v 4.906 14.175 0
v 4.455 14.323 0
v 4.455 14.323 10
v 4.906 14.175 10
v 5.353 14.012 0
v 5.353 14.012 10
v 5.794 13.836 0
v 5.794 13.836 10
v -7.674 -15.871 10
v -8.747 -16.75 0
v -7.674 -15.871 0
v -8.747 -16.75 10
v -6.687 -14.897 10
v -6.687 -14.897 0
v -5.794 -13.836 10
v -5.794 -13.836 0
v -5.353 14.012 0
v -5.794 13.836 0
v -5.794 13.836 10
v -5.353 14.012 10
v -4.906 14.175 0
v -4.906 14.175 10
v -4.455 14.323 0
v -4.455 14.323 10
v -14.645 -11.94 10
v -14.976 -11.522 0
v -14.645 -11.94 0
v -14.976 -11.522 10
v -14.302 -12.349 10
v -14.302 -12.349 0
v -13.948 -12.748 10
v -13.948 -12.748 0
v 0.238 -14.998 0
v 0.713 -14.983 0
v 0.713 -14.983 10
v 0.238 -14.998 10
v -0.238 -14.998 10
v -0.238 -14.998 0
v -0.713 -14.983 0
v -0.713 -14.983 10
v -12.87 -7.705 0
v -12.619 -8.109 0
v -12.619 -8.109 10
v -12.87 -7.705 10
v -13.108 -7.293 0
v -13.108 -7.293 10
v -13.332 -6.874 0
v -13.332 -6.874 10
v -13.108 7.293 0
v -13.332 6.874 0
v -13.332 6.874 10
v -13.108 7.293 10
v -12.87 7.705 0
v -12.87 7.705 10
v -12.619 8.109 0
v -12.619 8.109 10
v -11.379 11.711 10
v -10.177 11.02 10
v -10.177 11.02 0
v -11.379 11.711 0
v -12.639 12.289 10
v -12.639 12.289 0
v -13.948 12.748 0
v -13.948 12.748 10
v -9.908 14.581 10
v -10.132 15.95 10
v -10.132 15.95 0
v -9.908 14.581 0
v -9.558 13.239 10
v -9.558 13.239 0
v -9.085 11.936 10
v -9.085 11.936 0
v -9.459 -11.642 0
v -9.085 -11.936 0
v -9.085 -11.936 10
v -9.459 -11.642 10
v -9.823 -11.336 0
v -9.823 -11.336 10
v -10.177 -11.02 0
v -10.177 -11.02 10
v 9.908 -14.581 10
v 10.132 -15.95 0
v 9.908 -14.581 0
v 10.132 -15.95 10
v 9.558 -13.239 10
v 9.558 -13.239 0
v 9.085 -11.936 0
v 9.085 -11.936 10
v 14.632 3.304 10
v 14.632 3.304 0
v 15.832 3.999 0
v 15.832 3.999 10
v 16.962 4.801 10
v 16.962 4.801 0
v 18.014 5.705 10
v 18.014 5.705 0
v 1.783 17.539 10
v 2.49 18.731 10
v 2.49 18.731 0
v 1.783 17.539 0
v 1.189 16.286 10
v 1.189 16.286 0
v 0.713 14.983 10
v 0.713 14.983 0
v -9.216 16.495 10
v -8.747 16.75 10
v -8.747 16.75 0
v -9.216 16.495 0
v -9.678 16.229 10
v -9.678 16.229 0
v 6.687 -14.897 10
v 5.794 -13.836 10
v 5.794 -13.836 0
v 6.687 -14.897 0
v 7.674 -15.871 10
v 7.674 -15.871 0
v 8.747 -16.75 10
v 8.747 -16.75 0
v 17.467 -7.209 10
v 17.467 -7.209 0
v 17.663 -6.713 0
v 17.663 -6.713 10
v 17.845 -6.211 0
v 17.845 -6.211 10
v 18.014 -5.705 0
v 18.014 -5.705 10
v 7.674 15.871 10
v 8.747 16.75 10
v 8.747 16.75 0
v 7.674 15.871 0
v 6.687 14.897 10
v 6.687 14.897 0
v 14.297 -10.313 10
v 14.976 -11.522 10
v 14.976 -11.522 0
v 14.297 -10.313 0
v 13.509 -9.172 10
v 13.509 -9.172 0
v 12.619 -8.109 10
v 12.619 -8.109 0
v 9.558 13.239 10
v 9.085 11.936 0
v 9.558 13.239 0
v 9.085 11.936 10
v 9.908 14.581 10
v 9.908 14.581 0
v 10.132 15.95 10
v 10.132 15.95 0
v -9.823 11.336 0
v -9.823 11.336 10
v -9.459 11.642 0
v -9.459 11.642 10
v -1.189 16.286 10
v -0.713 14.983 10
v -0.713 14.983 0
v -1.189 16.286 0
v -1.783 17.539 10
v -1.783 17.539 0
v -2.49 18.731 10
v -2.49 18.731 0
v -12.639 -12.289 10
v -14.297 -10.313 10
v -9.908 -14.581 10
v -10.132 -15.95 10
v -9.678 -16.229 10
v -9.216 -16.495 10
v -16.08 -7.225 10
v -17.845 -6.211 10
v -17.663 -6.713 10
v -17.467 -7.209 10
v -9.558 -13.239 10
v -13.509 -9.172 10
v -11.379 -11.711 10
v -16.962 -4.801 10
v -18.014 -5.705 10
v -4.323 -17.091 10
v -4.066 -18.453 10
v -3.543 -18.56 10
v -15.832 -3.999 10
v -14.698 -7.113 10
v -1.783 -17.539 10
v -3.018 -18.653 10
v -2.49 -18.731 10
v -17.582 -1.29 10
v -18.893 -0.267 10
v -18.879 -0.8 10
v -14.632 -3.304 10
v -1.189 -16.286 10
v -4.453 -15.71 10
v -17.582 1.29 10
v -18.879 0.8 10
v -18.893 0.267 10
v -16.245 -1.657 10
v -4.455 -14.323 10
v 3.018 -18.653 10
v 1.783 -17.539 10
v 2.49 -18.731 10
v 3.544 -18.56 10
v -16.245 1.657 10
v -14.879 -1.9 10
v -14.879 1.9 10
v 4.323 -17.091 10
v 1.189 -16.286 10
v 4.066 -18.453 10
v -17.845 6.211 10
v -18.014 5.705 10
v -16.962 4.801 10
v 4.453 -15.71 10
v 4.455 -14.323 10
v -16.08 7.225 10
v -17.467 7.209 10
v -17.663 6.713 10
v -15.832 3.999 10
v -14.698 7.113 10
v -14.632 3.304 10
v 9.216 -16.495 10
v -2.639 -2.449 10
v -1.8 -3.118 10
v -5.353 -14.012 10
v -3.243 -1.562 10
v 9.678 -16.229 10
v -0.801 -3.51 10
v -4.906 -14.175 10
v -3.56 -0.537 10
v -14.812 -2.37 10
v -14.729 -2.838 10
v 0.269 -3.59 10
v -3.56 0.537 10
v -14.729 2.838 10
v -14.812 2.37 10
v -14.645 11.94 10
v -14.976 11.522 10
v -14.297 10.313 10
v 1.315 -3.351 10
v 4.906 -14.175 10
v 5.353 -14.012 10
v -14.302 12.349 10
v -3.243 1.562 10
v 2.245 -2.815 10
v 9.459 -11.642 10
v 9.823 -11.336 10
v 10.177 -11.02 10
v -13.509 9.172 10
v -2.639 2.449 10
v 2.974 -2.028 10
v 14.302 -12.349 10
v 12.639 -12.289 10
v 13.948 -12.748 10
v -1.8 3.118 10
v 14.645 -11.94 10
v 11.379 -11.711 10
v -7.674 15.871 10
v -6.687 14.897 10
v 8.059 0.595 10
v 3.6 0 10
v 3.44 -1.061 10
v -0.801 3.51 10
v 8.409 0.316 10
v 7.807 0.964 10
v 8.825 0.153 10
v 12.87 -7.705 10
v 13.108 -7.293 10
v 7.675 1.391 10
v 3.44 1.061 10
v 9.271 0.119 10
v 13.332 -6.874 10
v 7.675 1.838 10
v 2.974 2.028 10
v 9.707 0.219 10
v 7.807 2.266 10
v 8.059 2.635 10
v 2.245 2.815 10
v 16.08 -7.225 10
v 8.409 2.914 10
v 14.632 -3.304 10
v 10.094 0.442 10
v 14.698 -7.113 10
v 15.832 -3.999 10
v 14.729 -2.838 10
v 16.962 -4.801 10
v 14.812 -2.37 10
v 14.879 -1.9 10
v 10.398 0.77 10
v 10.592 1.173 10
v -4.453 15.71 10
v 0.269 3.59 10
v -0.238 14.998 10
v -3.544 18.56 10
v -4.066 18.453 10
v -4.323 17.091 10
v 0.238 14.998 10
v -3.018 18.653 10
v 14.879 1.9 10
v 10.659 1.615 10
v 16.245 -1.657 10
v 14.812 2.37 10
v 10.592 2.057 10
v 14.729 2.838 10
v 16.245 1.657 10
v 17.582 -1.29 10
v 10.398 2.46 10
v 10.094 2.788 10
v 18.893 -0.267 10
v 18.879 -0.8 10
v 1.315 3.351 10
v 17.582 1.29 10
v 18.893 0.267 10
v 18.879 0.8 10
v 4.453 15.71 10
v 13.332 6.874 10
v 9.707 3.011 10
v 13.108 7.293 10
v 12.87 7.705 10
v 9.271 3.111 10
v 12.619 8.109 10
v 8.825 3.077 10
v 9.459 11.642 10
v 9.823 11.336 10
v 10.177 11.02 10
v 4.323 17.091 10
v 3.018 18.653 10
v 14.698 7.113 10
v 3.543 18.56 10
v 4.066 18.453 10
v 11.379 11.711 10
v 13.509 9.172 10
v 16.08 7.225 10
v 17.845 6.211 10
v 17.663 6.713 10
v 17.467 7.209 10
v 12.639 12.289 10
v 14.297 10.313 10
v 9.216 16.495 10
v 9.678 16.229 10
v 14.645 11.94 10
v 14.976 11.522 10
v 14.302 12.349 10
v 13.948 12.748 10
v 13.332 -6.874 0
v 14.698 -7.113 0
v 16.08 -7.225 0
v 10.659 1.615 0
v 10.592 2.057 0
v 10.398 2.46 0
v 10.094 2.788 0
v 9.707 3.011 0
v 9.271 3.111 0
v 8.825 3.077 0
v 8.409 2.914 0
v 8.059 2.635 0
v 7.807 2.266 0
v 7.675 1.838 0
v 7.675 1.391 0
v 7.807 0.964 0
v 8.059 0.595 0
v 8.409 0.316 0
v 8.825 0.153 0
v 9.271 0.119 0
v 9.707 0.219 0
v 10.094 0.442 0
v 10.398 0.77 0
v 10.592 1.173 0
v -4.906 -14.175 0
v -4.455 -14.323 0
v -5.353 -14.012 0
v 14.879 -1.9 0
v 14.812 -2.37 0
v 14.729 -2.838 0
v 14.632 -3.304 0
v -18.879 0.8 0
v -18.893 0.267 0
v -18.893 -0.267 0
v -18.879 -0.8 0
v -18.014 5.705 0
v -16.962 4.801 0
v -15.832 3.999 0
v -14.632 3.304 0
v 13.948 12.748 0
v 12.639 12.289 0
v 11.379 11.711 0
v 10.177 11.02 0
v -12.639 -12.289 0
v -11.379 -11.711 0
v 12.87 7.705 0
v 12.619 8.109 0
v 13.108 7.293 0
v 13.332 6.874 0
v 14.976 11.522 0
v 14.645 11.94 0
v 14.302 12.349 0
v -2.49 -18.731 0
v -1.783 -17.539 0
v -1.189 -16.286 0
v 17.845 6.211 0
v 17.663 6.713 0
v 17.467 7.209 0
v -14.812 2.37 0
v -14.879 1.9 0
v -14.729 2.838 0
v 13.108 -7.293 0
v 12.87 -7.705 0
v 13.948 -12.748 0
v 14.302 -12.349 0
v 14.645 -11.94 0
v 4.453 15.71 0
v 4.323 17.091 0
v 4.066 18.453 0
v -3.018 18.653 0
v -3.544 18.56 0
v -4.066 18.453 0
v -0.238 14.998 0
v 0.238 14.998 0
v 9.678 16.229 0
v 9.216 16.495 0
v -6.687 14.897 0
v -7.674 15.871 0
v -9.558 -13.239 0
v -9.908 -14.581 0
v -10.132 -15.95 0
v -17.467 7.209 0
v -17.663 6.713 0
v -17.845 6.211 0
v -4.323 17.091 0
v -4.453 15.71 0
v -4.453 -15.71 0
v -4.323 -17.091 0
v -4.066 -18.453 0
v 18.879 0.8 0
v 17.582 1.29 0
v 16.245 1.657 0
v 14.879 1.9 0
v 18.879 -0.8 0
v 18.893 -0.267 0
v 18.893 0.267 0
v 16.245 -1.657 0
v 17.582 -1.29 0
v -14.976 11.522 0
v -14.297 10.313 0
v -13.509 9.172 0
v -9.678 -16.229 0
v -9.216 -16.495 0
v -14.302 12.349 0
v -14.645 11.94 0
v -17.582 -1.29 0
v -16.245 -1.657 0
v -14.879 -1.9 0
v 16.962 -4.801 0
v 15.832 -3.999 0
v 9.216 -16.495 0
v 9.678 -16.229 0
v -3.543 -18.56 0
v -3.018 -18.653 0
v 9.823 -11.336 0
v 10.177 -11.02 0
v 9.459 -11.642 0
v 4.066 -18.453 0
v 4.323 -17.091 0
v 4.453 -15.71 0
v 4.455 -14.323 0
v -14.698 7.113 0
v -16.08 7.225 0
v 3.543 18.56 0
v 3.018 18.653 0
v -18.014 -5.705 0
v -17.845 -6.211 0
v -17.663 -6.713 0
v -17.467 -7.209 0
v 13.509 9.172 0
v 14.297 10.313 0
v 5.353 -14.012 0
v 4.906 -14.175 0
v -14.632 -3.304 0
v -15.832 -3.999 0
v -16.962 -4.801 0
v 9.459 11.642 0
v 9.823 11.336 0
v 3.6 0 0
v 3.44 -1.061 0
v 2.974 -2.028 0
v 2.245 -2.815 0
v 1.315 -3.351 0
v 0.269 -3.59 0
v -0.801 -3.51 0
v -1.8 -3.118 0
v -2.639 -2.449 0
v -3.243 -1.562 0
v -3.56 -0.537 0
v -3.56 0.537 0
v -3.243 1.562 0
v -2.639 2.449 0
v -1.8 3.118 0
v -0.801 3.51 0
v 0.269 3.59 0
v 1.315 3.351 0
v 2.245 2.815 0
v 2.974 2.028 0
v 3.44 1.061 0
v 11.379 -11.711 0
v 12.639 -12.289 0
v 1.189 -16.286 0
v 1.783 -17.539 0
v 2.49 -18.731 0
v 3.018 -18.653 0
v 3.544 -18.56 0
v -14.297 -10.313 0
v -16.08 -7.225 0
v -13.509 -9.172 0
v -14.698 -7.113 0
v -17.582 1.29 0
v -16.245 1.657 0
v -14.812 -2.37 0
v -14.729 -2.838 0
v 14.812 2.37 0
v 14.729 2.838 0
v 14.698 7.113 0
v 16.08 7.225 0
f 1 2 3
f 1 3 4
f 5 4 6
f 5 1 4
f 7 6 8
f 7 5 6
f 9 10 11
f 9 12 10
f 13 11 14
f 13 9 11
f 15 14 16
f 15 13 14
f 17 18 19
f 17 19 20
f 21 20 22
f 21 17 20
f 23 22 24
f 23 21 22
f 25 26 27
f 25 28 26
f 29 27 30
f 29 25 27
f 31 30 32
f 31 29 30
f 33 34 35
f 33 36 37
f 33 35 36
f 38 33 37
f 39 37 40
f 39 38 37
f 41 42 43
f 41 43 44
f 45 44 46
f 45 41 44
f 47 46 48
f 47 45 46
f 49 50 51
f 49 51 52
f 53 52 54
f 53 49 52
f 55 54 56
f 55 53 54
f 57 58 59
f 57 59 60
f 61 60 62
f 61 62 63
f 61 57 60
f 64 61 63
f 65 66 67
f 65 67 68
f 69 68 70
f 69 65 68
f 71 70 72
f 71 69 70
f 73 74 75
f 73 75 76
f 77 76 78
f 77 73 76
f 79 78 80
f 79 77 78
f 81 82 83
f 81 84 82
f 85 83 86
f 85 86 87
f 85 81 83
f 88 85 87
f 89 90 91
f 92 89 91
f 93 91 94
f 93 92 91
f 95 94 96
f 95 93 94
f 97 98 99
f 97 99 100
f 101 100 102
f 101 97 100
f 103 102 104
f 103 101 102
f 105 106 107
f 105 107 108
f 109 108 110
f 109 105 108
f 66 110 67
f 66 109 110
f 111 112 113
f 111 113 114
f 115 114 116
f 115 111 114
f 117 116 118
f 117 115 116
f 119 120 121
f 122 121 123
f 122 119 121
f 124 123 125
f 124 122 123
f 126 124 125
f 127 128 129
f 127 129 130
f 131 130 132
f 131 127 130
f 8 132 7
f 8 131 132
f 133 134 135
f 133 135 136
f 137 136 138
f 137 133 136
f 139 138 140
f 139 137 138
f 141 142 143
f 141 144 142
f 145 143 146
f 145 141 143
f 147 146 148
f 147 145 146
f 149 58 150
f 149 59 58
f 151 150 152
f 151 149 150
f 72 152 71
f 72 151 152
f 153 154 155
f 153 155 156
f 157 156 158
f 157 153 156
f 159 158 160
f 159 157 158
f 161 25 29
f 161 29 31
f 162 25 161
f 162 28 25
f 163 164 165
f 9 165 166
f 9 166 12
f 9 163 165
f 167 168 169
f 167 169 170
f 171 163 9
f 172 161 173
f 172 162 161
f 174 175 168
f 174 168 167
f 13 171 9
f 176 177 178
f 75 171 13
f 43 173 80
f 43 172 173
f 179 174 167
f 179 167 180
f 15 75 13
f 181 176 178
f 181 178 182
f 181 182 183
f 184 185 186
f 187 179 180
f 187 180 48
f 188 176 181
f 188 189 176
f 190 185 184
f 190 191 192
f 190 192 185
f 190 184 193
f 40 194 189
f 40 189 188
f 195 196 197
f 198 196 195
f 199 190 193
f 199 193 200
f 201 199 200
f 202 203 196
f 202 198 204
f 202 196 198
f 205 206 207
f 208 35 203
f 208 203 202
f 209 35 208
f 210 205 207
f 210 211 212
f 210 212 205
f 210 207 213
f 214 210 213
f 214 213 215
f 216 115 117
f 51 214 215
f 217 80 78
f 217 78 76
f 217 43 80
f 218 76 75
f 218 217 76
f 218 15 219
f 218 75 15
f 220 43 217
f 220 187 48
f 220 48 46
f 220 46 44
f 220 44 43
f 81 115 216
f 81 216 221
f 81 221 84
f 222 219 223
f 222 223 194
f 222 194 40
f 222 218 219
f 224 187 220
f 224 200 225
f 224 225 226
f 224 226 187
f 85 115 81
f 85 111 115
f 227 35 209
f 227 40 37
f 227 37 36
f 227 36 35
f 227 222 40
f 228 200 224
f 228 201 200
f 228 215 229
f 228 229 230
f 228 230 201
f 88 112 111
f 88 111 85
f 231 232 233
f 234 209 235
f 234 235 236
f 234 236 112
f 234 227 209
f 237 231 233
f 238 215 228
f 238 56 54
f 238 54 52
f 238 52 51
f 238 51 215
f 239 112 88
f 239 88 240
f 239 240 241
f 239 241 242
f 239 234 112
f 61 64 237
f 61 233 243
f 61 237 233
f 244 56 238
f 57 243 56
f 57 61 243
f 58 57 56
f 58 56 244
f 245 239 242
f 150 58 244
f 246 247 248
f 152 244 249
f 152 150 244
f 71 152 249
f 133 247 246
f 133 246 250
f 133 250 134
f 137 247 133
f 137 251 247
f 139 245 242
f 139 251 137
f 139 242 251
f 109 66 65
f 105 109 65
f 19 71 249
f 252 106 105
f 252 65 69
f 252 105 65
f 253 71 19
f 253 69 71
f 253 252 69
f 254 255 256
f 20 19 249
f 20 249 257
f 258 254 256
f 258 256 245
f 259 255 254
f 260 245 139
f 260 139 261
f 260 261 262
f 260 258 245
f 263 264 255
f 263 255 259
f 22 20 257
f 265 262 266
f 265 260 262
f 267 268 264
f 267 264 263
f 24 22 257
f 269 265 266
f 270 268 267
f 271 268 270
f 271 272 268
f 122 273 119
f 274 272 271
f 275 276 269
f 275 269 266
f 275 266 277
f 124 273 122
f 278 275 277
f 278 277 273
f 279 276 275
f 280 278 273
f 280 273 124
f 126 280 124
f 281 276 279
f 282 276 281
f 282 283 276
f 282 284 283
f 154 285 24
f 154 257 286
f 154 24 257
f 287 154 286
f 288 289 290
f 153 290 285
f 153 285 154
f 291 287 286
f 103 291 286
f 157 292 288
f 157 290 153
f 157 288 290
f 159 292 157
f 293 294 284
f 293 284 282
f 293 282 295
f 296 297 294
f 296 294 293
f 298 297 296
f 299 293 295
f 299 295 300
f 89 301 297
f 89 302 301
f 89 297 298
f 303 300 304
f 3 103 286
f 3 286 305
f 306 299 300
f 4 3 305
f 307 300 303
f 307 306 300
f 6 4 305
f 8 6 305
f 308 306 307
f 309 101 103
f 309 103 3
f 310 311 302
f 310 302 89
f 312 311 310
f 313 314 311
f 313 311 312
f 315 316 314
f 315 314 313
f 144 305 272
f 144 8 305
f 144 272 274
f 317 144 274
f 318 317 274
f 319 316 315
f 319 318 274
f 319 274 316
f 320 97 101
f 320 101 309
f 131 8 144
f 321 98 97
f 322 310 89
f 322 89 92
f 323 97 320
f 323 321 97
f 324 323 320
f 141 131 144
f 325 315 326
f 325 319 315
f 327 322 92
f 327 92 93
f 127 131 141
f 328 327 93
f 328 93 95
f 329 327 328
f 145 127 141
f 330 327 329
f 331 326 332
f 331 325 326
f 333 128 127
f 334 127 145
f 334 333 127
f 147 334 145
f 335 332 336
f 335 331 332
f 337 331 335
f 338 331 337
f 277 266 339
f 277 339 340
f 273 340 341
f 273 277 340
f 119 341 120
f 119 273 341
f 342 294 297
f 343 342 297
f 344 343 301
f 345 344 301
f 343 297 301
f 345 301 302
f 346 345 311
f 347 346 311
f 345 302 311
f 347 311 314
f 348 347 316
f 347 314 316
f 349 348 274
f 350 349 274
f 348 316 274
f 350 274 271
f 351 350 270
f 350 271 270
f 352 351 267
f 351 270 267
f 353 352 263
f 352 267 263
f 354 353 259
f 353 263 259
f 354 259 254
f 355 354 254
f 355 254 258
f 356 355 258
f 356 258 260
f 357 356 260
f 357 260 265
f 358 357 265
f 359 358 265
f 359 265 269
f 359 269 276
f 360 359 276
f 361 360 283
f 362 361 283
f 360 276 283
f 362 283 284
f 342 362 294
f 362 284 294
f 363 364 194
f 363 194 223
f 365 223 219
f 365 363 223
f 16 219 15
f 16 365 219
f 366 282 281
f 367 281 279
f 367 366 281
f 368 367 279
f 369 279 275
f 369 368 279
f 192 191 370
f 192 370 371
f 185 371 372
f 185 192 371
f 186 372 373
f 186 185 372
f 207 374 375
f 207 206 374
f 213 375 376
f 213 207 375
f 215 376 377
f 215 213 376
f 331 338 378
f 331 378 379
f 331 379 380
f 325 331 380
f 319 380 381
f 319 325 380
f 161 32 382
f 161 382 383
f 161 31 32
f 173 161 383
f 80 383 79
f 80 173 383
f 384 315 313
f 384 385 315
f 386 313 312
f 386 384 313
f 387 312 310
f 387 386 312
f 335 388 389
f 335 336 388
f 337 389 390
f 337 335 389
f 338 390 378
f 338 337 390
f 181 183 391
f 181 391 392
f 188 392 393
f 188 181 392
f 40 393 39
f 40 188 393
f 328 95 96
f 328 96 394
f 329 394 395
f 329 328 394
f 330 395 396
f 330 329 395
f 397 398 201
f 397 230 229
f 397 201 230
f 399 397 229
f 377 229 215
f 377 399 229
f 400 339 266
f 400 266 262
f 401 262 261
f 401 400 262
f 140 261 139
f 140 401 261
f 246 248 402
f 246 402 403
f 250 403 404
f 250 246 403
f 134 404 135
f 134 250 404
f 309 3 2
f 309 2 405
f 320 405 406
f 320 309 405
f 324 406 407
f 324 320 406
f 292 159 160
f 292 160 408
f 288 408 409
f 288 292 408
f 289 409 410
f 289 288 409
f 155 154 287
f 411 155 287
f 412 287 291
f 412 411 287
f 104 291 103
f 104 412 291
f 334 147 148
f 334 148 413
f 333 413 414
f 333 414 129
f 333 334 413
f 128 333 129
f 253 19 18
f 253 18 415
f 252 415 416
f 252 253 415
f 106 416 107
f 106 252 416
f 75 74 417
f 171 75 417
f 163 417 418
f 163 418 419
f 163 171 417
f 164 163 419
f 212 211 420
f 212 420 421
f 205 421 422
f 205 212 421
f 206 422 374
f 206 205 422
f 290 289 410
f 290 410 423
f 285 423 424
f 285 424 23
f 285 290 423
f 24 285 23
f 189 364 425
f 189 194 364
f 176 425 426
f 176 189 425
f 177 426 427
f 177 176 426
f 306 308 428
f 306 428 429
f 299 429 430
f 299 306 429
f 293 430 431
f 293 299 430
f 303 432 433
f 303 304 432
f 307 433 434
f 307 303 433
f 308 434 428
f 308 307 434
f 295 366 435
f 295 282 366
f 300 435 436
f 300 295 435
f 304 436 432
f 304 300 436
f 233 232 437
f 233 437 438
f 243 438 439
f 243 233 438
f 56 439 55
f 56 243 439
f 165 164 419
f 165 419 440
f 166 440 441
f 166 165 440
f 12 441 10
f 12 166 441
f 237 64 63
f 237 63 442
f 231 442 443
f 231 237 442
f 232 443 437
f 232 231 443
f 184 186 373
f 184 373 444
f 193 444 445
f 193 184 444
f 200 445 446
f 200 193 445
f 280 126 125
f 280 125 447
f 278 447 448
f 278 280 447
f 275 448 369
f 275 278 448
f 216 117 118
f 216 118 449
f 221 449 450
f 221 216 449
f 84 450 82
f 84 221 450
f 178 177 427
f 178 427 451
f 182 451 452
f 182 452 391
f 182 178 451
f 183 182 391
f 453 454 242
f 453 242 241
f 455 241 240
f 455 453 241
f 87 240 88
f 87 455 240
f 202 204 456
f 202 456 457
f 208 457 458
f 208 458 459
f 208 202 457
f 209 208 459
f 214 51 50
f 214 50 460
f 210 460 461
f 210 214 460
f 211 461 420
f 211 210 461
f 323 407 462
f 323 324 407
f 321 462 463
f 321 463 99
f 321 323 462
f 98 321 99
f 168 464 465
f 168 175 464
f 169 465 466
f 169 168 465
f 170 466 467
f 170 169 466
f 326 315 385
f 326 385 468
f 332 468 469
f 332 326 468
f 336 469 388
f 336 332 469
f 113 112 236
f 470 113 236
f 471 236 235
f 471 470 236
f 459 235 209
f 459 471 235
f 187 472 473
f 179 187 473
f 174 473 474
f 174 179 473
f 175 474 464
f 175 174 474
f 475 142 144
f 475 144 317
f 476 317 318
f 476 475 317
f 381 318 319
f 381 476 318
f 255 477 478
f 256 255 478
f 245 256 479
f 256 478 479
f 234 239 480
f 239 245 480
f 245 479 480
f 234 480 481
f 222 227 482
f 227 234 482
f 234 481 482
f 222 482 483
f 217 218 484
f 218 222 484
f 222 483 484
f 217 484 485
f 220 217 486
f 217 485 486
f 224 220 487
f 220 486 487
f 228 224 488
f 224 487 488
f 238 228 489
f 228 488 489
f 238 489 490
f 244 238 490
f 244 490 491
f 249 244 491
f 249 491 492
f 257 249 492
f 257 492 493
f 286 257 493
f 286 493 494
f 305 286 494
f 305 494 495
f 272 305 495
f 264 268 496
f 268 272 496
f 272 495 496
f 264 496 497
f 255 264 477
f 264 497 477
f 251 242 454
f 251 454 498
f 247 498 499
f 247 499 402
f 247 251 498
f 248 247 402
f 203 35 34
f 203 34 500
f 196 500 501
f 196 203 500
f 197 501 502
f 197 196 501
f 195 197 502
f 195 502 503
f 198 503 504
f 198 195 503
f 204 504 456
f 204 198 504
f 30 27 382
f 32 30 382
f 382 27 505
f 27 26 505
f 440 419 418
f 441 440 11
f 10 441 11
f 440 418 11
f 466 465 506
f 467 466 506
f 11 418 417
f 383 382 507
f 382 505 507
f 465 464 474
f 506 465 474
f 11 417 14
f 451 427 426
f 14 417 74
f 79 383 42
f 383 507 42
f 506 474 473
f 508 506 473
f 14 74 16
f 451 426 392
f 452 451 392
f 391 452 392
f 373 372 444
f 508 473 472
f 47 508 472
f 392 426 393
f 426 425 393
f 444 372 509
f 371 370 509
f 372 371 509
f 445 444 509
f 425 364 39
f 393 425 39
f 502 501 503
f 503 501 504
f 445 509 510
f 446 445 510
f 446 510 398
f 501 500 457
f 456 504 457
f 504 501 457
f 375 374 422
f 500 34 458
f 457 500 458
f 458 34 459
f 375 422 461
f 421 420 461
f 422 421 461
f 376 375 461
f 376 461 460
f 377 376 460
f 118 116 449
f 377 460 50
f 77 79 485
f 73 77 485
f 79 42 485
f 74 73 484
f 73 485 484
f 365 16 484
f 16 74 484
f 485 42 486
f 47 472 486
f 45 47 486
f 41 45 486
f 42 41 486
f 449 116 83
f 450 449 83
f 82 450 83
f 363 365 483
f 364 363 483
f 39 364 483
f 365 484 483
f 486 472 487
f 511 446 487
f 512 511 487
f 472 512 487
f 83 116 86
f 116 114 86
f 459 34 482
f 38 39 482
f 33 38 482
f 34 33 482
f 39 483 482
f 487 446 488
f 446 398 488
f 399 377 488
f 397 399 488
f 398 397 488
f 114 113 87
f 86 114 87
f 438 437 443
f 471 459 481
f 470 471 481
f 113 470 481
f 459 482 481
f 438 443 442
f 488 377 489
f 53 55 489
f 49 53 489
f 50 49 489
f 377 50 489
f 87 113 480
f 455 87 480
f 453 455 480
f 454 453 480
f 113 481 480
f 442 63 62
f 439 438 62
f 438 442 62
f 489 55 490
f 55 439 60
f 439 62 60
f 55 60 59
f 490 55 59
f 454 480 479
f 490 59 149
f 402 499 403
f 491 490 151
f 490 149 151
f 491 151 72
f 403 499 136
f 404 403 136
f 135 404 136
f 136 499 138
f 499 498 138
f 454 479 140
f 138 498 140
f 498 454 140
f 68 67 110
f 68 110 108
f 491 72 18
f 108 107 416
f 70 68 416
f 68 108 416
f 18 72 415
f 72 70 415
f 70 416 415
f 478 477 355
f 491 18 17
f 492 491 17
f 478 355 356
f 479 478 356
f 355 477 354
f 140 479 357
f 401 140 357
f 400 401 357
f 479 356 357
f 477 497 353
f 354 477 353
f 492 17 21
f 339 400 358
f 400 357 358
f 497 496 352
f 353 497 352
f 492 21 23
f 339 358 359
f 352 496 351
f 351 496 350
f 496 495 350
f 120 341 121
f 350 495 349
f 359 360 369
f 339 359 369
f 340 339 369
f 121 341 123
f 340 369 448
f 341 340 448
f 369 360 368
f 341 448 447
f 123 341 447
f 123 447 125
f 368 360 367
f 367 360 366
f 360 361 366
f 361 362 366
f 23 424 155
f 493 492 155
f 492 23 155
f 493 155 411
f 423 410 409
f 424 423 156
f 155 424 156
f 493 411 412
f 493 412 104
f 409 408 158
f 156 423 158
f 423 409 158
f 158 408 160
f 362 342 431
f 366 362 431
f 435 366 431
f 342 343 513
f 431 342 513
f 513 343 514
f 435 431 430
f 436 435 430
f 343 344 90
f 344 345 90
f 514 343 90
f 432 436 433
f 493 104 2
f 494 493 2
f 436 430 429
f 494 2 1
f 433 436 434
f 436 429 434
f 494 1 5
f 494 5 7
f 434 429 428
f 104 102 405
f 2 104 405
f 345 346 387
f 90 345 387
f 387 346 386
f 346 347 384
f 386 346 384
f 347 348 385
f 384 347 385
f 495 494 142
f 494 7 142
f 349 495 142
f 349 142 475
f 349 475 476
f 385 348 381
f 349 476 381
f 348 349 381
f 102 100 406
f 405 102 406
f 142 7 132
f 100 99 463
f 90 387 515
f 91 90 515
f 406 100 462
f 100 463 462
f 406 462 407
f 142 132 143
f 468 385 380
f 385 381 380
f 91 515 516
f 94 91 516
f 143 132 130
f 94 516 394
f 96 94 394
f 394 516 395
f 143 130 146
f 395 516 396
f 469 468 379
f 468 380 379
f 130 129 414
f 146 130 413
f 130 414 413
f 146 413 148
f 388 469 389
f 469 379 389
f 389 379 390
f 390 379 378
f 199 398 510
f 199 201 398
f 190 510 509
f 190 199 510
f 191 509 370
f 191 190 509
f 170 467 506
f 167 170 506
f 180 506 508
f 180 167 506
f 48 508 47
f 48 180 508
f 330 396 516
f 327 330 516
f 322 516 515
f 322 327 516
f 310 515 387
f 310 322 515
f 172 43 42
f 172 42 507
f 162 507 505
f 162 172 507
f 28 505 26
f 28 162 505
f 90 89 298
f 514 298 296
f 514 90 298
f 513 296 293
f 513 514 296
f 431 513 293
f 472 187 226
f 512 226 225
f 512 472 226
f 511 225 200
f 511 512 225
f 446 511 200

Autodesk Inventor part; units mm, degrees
ref_plane "YZ Plane" through (0, 0, 0) normal (1, 0, 0) x (0, 1, 0)
ref_plane "XZ Plane" through (0, 0, 0) normal (0, 1, 0) x (-1, 0, 0)
ref_plane "XY Plane" through (0, 0, 0) normal (0, 0, 1) x (1, 0, 0)
sketch "Sketch1" plane through (0, 0, 0) normal (0, 0, 1) x (1, 0, 0)
  circle A0 centre (0, 0) radius 15
  circle A1 centre (0, 0) radius 3.6
  dimension "d0" = 30
  dimension "d1" = 7.2
extrude "Extrusion1" add sketch "Sketch1" along normal blind 10
sketch "Sketch3" plane through (0, 0, 10) normal (0, 0, 1) x (1, 0, 0)
  line L0 (0, 0) -> (25, 0) construction
  arc A0 (18.8792, 0.8) -> (14.8792, 1.9) centre (12.94, -12.9741) ccw
  circle A1 centre (0, 0) radius 15 projected
  arc A2 (18.8792, -0.8) -> (18.8792, 0.8) centre (-1.1048, 0) ccw
  arc A3 (14.8792, -1.9) -> (18.8792, -0.8) centre (12.94, 12.9741) ccw
  arc A4 (14.8792, -1.9) -> (14.8792, 1.9) centre (0, 0) ccw
  arc A5 (17.467, 7.2088) -> (13.332, 6.8744) centre (16.5971, -7.7659) ccw
  arc A6 (18.0142, 5.7053) -> (17.467, 7.2088) centre (-1.0382, -0.3779) ccw
  arc A7 (14.6317, 3.3036) -> (18.0142, 5.7053) centre (7.7223, 16.6175) ccw
  arc A8 (14.6317, 3.3036) -> (13.332, 6.8744) centre (0, 0) ccw
  arc A9 (13.9481, 12.7481) -> (10.1768, 11.0196) centre (18.2523, -1.6211) ccw
  arc A10 (14.9765, 11.5225) -> (13.9481, 12.7481) centre (-0.8463, -0.7102) ccw
  arc A11 (12.6194, 8.1087) -> (14.9765, 11.5225) centre (1.573, 18.2565) ccw
  arc A12 (12.6194, 8.1087) -> (10.1768, 11.0196) centre (0, 0) ccw
  arc A13 (8.7468, 16.7498) -> (5.7941, 13.8357) centre (17.7059, 4.7193) ccw
  arc A14 (10.1324, 15.9498) -> (8.7468, 16.7498) centre (-0.5524, -0.9568) ccw
  arc A15 (9.085, 11.9357) -> (10.1324, 15.9498) centre (-4.7659, 17.6935) ccw
  arc A16 (9.085, 11.9357) -> (5.7941, 13.8357) centre (0, 0) ccw
  arc A17 (2.4905, 18.7313) -> (0.7126, 14.9831) centre (15.024, 10.4905) ccw
  arc A18 (4.0662, 18.4534) -> (2.4905, 18.7313) centre (-0.1918, -1.088) ccw
  arc A19 (4.4549, 14.3232) -> (4.0662, 18.4534) centre (-10.53, 14.9964) ccw
  arc A20 (4.4549, 14.3232) -> (0.7126, 14.9831) centre (0, 0) ccw
  arc A21 (-4.0662, 18.4534) -> (-4.4549, 14.3232) centre (10.53, 14.9964) ccw
  arc A22 (-2.4905, 18.7313) -> (-4.0662, 18.4534) centre (0.1918, -1.088) ccw
  arc A23 (-0.7126, 14.9831) -> (-2.4905, 18.7313) centre (-15.024, 10.4905) ccw
  arc A24 (-0.7126, 14.9831) -> (-4.4549, 14.3232) centre (0, 0) ccw
  arc A25 (-10.1324, 15.9498) -> (-9.085, 11.9357) centre (4.7659, 17.6935) ccw
  arc A26 (-8.7468, 16.7498) -> (-10.1324, 15.9498) centre (0.5524, -0.9568) ccw
  arc A27 (-5.7941, 13.8357) -> (-8.7468, 16.7498) centre (-17.7059, 4.7193) ccw
  arc A28 (-5.7941, 13.8357) -> (-9.085, 11.9357) centre (0, 0) ccw
  arc A29 (-14.9765, 11.5225) -> (-12.6194, 8.1087) centre (-1.573, 18.2565) ccw
  arc A30 (-13.9481, 12.7481) -> (-14.9765, 11.5225) centre (0.8463, -0.7102) ccw
  arc A31 (-10.1768, 11.0196) -> (-13.9481, 12.7481) centre (-18.2523, -1.6211) ccw
  arc A32 (-10.1768, 11.0196) -> (-12.6194, 8.1087) centre (0, 0) ccw
  arc A33 (-18.0142, 5.7053) -> (-14.6317, 3.3036) centre (-7.7223, 16.6175) ccw
  arc A34 (-17.467, 7.2088) -> (-18.0142, 5.7053) centre (1.0382, -0.3779) ccw
  arc A35 (-13.332, 6.8744) -> (-17.467, 7.2088) centre (-16.5971, -7.7659) ccw
  arc A36 (-13.332, 6.8744) -> (-14.6317, 3.3036) centre (0, 0) ccw
  arc A37 (-18.8792, -0.8) -> (-14.8792, -1.9) centre (-12.94, 12.9741) ccw
  arc A38 (-18.8792, 0.8) -> (-18.8792, -0.8) centre (1.1048, 0) ccw
  arc A39 (-14.8792, 1.9) -> (-18.8792, 0.8) centre (-12.94, -12.9741) ccw
  arc A40 (-14.8792, 1.9) -> (-14.8792, -1.9) centre (0, 0) ccw
  arc A41 (-17.467, -7.2088) -> (-13.332, -6.8744) centre (-16.5971, 7.7659) ccw
  arc A42 (-18.0142, -5.7053) -> (-17.467, -7.2088) centre (1.0382, 0.3779) ccw
  arc A43 (-14.6317, -3.3036) -> (-18.0142, -5.7053) centre (-7.7223, -16.6175) ccw
  arc A44 (-14.6317, -3.3036) -> (-13.332, -6.8744) centre (0, 0) ccw
  arc A45 (-13.9481, -12.7481) -> (-10.1768, -11.0196) centre (-18.2523, 1.6211) ccw
  arc A46 (-14.9765, -11.5225) -> (-13.9481, -12.7481) centre (0.8463, 0.7102) ccw
  arc A47 (-12.6194, -8.1087) -> (-14.9765, -11.5225) centre (-1.573, -18.2565) ccw
  arc A48 (-12.6194, -8.1087) -> (-10.1768, -11.0196) centre (0, 0) ccw
  arc A49 (-8.7468, -16.7498) -> (-5.7941, -13.8357) centre (-17.7059, -4.7193) ccw
  arc A50 (-10.1324, -15.9498) -> (-8.7468, -16.7498) centre (0.5524, 0.9568) ccw
  arc A51 (-9.085, -11.9357) -> (-10.1324, -15.9498) centre (4.7659, -17.6935) ccw
  arc A52 (-9.085, -11.9357) -> (-5.7941, -13.8357) centre (0, 0) ccw
  arc A53 (-2.4905, -18.7313) -> (-0.7126, -14.9831) centre (-15.024, -10.4905) ccw
  arc A54 (-4.0662, -18.4534) -> (-2.4905, -18.7313) centre (0.1918, 1.088) ccw
  arc A55 (-4.4549, -14.3232) -> (-4.0662, -18.4534) centre (10.53, -14.9964) ccw
  arc A56 (-4.4549, -14.3232) -> (-0.7126, -14.9831) centre (0, 0) ccw
  arc A57 (4.0662, -18.4534) -> (4.4549, -14.3232) centre (-10.53, -14.9964) ccw
  arc A58 (2.4905, -18.7313) -> (4.0662, -18.4534) centre (-0.1918, 1.088) ccw
  arc A59 (0.7126, -14.9831) -> (2.4905, -18.7313) centre (15.024, -10.4905) ccw
  arc A60 (0.7126, -14.9831) -> (4.4549, -14.3232) centre (0, 0) ccw
  arc A61 (10.1324, -15.9498) -> (9.085, -11.9357) centre (-4.7659, -17.6935) ccw
  arc A62 (8.7468, -16.7498) -> (10.1324, -15.9498) centre (-0.5524, 0.9568) ccw
  arc A63 (5.7941, -13.8357) -> (8.7468, -16.7498) centre (17.7059, -4.7193) ccw
  arc A64 (5.7941, -13.8357) -> (9.085, -11.9357) centre (0, 0) ccw
  arc A65 (14.9765, -11.5225) -> (12.6194, -8.1087) centre (1.573, -18.2565) ccw
  arc A66 (13.9481, -12.7481) -> (14.9765, -11.5225) centre (-0.8463, 0.7102) ccw
  arc A67 (10.1768, -11.0196) -> (13.9481, -12.7481) centre (18.2523, 1.6211) ccw
  arc A68 (10.1768, -11.0196) -> (12.6194, -8.1087) centre (0, 0) ccw
  arc A69 (18.0142, -5.7053) -> (14.6317, -3.3036) centre (7.7223, -16.6175) ccw
  arc A70 (17.467, -7.2088) -> (18.0142, -5.7053) centre (-1.0382, 0.3779) ccw
  arc A71 (13.332, -6.8744) -> (17.467, -7.2088) centre (16.5971, 7.7659) ccw
  arc A72 (13.332, -6.8744) -> (14.6317, -3.3036) centre (0, 0) ccw
  point P0 (18.8952, 0)
  point P1 (17.7557, 6.4625)
  point P2 (14.4746, 12.1456)
  point P3 (9.4476, 16.3637)
  point P4 (3.2811, 18.6081)
  point P5 (-3.2811, 18.6081)
  point P6 (-9.4476, 16.3637)
  point P7 (-14.4746, 12.1456)
  point P8 (-17.7557, 6.4625)
  point P9 (-18.8952, 0)
  point P10 (-17.7557, -6.4625)
  point P11 (-14.4746, -12.1456)
  point P12 (-9.4476, -16.3637)
  point P13 (-3.2811, -18.6081)
  point P14 (3.2811, -18.6081)
  point P15 (9.4476, -16.3637)
  point P16 (14.4746, -12.1456)
  point P17 (17.7557, -6.4625)
  dimension "d8" = 25
  dimension "d9" = 15
  dimension "d10" = 1.6
  dimension "d11" = 20
  dimension "d12" = 4
  dimension "d13" = 1.1
  dimension "d14" = 15
  dimension "d15" = 1.1
  dimension "d16" = 4
  dimension "d19" = 360
extrude "Extrusion3" add sketch "Sketch3" against normal blind 10 contours A2 A3 A1 A0 | A1 A5 A6 A7 | A69 A70 A71 A1 | A1 A9 A10 A11 | A65 A66 A67 A1 | A1 A13 A14 A15 | A61 A62 A63 A1 | A1 A17 A18 A19 | A57 A58 A59 A1 | A1 A21 A22 A23 | A53 A54 A55 A1 | A1 A25 A26 A27 | A49 A50 A51 A1 | A1 A29 A30 A31 | A45 A46 A47 A1 | A1 A33 A34 A35 | A41 A42 A43 A1 | A1 A37 A38 A39
sketch "Sketch2" plane through (0, 0, 10) normal (0, 0, 1) x (1, 0, 0)
  circle A0 centre (9.1587, 1.6149) radius 1.5
  circle A1 centre (0, 0) radius 15 construction
  circle A2 centre (0, 0) radius 3.6 construction
  circle A3 centre (0, 0) radius 3.6 construction
  circle A4 centre (0, 0) radius 15 construction
  arc A5 (14.8792, 1.9) -> (14.6317, 3.3036) centre (0, 0) ccw
  line L0 (3.5453, 0.6251) -> (14.7721, 2.6047) construction
  line L1 (0, 0) -> (3.5453, 0.6251) construction
  line L2 (0, 0) -> (14.7721, 2.6047) construction
  dimension "d4" = 3
extrude "Extrusion2" cut sketch "Sketch2" against normal through all
properties part number "GA002" material "ABS Plastic"
